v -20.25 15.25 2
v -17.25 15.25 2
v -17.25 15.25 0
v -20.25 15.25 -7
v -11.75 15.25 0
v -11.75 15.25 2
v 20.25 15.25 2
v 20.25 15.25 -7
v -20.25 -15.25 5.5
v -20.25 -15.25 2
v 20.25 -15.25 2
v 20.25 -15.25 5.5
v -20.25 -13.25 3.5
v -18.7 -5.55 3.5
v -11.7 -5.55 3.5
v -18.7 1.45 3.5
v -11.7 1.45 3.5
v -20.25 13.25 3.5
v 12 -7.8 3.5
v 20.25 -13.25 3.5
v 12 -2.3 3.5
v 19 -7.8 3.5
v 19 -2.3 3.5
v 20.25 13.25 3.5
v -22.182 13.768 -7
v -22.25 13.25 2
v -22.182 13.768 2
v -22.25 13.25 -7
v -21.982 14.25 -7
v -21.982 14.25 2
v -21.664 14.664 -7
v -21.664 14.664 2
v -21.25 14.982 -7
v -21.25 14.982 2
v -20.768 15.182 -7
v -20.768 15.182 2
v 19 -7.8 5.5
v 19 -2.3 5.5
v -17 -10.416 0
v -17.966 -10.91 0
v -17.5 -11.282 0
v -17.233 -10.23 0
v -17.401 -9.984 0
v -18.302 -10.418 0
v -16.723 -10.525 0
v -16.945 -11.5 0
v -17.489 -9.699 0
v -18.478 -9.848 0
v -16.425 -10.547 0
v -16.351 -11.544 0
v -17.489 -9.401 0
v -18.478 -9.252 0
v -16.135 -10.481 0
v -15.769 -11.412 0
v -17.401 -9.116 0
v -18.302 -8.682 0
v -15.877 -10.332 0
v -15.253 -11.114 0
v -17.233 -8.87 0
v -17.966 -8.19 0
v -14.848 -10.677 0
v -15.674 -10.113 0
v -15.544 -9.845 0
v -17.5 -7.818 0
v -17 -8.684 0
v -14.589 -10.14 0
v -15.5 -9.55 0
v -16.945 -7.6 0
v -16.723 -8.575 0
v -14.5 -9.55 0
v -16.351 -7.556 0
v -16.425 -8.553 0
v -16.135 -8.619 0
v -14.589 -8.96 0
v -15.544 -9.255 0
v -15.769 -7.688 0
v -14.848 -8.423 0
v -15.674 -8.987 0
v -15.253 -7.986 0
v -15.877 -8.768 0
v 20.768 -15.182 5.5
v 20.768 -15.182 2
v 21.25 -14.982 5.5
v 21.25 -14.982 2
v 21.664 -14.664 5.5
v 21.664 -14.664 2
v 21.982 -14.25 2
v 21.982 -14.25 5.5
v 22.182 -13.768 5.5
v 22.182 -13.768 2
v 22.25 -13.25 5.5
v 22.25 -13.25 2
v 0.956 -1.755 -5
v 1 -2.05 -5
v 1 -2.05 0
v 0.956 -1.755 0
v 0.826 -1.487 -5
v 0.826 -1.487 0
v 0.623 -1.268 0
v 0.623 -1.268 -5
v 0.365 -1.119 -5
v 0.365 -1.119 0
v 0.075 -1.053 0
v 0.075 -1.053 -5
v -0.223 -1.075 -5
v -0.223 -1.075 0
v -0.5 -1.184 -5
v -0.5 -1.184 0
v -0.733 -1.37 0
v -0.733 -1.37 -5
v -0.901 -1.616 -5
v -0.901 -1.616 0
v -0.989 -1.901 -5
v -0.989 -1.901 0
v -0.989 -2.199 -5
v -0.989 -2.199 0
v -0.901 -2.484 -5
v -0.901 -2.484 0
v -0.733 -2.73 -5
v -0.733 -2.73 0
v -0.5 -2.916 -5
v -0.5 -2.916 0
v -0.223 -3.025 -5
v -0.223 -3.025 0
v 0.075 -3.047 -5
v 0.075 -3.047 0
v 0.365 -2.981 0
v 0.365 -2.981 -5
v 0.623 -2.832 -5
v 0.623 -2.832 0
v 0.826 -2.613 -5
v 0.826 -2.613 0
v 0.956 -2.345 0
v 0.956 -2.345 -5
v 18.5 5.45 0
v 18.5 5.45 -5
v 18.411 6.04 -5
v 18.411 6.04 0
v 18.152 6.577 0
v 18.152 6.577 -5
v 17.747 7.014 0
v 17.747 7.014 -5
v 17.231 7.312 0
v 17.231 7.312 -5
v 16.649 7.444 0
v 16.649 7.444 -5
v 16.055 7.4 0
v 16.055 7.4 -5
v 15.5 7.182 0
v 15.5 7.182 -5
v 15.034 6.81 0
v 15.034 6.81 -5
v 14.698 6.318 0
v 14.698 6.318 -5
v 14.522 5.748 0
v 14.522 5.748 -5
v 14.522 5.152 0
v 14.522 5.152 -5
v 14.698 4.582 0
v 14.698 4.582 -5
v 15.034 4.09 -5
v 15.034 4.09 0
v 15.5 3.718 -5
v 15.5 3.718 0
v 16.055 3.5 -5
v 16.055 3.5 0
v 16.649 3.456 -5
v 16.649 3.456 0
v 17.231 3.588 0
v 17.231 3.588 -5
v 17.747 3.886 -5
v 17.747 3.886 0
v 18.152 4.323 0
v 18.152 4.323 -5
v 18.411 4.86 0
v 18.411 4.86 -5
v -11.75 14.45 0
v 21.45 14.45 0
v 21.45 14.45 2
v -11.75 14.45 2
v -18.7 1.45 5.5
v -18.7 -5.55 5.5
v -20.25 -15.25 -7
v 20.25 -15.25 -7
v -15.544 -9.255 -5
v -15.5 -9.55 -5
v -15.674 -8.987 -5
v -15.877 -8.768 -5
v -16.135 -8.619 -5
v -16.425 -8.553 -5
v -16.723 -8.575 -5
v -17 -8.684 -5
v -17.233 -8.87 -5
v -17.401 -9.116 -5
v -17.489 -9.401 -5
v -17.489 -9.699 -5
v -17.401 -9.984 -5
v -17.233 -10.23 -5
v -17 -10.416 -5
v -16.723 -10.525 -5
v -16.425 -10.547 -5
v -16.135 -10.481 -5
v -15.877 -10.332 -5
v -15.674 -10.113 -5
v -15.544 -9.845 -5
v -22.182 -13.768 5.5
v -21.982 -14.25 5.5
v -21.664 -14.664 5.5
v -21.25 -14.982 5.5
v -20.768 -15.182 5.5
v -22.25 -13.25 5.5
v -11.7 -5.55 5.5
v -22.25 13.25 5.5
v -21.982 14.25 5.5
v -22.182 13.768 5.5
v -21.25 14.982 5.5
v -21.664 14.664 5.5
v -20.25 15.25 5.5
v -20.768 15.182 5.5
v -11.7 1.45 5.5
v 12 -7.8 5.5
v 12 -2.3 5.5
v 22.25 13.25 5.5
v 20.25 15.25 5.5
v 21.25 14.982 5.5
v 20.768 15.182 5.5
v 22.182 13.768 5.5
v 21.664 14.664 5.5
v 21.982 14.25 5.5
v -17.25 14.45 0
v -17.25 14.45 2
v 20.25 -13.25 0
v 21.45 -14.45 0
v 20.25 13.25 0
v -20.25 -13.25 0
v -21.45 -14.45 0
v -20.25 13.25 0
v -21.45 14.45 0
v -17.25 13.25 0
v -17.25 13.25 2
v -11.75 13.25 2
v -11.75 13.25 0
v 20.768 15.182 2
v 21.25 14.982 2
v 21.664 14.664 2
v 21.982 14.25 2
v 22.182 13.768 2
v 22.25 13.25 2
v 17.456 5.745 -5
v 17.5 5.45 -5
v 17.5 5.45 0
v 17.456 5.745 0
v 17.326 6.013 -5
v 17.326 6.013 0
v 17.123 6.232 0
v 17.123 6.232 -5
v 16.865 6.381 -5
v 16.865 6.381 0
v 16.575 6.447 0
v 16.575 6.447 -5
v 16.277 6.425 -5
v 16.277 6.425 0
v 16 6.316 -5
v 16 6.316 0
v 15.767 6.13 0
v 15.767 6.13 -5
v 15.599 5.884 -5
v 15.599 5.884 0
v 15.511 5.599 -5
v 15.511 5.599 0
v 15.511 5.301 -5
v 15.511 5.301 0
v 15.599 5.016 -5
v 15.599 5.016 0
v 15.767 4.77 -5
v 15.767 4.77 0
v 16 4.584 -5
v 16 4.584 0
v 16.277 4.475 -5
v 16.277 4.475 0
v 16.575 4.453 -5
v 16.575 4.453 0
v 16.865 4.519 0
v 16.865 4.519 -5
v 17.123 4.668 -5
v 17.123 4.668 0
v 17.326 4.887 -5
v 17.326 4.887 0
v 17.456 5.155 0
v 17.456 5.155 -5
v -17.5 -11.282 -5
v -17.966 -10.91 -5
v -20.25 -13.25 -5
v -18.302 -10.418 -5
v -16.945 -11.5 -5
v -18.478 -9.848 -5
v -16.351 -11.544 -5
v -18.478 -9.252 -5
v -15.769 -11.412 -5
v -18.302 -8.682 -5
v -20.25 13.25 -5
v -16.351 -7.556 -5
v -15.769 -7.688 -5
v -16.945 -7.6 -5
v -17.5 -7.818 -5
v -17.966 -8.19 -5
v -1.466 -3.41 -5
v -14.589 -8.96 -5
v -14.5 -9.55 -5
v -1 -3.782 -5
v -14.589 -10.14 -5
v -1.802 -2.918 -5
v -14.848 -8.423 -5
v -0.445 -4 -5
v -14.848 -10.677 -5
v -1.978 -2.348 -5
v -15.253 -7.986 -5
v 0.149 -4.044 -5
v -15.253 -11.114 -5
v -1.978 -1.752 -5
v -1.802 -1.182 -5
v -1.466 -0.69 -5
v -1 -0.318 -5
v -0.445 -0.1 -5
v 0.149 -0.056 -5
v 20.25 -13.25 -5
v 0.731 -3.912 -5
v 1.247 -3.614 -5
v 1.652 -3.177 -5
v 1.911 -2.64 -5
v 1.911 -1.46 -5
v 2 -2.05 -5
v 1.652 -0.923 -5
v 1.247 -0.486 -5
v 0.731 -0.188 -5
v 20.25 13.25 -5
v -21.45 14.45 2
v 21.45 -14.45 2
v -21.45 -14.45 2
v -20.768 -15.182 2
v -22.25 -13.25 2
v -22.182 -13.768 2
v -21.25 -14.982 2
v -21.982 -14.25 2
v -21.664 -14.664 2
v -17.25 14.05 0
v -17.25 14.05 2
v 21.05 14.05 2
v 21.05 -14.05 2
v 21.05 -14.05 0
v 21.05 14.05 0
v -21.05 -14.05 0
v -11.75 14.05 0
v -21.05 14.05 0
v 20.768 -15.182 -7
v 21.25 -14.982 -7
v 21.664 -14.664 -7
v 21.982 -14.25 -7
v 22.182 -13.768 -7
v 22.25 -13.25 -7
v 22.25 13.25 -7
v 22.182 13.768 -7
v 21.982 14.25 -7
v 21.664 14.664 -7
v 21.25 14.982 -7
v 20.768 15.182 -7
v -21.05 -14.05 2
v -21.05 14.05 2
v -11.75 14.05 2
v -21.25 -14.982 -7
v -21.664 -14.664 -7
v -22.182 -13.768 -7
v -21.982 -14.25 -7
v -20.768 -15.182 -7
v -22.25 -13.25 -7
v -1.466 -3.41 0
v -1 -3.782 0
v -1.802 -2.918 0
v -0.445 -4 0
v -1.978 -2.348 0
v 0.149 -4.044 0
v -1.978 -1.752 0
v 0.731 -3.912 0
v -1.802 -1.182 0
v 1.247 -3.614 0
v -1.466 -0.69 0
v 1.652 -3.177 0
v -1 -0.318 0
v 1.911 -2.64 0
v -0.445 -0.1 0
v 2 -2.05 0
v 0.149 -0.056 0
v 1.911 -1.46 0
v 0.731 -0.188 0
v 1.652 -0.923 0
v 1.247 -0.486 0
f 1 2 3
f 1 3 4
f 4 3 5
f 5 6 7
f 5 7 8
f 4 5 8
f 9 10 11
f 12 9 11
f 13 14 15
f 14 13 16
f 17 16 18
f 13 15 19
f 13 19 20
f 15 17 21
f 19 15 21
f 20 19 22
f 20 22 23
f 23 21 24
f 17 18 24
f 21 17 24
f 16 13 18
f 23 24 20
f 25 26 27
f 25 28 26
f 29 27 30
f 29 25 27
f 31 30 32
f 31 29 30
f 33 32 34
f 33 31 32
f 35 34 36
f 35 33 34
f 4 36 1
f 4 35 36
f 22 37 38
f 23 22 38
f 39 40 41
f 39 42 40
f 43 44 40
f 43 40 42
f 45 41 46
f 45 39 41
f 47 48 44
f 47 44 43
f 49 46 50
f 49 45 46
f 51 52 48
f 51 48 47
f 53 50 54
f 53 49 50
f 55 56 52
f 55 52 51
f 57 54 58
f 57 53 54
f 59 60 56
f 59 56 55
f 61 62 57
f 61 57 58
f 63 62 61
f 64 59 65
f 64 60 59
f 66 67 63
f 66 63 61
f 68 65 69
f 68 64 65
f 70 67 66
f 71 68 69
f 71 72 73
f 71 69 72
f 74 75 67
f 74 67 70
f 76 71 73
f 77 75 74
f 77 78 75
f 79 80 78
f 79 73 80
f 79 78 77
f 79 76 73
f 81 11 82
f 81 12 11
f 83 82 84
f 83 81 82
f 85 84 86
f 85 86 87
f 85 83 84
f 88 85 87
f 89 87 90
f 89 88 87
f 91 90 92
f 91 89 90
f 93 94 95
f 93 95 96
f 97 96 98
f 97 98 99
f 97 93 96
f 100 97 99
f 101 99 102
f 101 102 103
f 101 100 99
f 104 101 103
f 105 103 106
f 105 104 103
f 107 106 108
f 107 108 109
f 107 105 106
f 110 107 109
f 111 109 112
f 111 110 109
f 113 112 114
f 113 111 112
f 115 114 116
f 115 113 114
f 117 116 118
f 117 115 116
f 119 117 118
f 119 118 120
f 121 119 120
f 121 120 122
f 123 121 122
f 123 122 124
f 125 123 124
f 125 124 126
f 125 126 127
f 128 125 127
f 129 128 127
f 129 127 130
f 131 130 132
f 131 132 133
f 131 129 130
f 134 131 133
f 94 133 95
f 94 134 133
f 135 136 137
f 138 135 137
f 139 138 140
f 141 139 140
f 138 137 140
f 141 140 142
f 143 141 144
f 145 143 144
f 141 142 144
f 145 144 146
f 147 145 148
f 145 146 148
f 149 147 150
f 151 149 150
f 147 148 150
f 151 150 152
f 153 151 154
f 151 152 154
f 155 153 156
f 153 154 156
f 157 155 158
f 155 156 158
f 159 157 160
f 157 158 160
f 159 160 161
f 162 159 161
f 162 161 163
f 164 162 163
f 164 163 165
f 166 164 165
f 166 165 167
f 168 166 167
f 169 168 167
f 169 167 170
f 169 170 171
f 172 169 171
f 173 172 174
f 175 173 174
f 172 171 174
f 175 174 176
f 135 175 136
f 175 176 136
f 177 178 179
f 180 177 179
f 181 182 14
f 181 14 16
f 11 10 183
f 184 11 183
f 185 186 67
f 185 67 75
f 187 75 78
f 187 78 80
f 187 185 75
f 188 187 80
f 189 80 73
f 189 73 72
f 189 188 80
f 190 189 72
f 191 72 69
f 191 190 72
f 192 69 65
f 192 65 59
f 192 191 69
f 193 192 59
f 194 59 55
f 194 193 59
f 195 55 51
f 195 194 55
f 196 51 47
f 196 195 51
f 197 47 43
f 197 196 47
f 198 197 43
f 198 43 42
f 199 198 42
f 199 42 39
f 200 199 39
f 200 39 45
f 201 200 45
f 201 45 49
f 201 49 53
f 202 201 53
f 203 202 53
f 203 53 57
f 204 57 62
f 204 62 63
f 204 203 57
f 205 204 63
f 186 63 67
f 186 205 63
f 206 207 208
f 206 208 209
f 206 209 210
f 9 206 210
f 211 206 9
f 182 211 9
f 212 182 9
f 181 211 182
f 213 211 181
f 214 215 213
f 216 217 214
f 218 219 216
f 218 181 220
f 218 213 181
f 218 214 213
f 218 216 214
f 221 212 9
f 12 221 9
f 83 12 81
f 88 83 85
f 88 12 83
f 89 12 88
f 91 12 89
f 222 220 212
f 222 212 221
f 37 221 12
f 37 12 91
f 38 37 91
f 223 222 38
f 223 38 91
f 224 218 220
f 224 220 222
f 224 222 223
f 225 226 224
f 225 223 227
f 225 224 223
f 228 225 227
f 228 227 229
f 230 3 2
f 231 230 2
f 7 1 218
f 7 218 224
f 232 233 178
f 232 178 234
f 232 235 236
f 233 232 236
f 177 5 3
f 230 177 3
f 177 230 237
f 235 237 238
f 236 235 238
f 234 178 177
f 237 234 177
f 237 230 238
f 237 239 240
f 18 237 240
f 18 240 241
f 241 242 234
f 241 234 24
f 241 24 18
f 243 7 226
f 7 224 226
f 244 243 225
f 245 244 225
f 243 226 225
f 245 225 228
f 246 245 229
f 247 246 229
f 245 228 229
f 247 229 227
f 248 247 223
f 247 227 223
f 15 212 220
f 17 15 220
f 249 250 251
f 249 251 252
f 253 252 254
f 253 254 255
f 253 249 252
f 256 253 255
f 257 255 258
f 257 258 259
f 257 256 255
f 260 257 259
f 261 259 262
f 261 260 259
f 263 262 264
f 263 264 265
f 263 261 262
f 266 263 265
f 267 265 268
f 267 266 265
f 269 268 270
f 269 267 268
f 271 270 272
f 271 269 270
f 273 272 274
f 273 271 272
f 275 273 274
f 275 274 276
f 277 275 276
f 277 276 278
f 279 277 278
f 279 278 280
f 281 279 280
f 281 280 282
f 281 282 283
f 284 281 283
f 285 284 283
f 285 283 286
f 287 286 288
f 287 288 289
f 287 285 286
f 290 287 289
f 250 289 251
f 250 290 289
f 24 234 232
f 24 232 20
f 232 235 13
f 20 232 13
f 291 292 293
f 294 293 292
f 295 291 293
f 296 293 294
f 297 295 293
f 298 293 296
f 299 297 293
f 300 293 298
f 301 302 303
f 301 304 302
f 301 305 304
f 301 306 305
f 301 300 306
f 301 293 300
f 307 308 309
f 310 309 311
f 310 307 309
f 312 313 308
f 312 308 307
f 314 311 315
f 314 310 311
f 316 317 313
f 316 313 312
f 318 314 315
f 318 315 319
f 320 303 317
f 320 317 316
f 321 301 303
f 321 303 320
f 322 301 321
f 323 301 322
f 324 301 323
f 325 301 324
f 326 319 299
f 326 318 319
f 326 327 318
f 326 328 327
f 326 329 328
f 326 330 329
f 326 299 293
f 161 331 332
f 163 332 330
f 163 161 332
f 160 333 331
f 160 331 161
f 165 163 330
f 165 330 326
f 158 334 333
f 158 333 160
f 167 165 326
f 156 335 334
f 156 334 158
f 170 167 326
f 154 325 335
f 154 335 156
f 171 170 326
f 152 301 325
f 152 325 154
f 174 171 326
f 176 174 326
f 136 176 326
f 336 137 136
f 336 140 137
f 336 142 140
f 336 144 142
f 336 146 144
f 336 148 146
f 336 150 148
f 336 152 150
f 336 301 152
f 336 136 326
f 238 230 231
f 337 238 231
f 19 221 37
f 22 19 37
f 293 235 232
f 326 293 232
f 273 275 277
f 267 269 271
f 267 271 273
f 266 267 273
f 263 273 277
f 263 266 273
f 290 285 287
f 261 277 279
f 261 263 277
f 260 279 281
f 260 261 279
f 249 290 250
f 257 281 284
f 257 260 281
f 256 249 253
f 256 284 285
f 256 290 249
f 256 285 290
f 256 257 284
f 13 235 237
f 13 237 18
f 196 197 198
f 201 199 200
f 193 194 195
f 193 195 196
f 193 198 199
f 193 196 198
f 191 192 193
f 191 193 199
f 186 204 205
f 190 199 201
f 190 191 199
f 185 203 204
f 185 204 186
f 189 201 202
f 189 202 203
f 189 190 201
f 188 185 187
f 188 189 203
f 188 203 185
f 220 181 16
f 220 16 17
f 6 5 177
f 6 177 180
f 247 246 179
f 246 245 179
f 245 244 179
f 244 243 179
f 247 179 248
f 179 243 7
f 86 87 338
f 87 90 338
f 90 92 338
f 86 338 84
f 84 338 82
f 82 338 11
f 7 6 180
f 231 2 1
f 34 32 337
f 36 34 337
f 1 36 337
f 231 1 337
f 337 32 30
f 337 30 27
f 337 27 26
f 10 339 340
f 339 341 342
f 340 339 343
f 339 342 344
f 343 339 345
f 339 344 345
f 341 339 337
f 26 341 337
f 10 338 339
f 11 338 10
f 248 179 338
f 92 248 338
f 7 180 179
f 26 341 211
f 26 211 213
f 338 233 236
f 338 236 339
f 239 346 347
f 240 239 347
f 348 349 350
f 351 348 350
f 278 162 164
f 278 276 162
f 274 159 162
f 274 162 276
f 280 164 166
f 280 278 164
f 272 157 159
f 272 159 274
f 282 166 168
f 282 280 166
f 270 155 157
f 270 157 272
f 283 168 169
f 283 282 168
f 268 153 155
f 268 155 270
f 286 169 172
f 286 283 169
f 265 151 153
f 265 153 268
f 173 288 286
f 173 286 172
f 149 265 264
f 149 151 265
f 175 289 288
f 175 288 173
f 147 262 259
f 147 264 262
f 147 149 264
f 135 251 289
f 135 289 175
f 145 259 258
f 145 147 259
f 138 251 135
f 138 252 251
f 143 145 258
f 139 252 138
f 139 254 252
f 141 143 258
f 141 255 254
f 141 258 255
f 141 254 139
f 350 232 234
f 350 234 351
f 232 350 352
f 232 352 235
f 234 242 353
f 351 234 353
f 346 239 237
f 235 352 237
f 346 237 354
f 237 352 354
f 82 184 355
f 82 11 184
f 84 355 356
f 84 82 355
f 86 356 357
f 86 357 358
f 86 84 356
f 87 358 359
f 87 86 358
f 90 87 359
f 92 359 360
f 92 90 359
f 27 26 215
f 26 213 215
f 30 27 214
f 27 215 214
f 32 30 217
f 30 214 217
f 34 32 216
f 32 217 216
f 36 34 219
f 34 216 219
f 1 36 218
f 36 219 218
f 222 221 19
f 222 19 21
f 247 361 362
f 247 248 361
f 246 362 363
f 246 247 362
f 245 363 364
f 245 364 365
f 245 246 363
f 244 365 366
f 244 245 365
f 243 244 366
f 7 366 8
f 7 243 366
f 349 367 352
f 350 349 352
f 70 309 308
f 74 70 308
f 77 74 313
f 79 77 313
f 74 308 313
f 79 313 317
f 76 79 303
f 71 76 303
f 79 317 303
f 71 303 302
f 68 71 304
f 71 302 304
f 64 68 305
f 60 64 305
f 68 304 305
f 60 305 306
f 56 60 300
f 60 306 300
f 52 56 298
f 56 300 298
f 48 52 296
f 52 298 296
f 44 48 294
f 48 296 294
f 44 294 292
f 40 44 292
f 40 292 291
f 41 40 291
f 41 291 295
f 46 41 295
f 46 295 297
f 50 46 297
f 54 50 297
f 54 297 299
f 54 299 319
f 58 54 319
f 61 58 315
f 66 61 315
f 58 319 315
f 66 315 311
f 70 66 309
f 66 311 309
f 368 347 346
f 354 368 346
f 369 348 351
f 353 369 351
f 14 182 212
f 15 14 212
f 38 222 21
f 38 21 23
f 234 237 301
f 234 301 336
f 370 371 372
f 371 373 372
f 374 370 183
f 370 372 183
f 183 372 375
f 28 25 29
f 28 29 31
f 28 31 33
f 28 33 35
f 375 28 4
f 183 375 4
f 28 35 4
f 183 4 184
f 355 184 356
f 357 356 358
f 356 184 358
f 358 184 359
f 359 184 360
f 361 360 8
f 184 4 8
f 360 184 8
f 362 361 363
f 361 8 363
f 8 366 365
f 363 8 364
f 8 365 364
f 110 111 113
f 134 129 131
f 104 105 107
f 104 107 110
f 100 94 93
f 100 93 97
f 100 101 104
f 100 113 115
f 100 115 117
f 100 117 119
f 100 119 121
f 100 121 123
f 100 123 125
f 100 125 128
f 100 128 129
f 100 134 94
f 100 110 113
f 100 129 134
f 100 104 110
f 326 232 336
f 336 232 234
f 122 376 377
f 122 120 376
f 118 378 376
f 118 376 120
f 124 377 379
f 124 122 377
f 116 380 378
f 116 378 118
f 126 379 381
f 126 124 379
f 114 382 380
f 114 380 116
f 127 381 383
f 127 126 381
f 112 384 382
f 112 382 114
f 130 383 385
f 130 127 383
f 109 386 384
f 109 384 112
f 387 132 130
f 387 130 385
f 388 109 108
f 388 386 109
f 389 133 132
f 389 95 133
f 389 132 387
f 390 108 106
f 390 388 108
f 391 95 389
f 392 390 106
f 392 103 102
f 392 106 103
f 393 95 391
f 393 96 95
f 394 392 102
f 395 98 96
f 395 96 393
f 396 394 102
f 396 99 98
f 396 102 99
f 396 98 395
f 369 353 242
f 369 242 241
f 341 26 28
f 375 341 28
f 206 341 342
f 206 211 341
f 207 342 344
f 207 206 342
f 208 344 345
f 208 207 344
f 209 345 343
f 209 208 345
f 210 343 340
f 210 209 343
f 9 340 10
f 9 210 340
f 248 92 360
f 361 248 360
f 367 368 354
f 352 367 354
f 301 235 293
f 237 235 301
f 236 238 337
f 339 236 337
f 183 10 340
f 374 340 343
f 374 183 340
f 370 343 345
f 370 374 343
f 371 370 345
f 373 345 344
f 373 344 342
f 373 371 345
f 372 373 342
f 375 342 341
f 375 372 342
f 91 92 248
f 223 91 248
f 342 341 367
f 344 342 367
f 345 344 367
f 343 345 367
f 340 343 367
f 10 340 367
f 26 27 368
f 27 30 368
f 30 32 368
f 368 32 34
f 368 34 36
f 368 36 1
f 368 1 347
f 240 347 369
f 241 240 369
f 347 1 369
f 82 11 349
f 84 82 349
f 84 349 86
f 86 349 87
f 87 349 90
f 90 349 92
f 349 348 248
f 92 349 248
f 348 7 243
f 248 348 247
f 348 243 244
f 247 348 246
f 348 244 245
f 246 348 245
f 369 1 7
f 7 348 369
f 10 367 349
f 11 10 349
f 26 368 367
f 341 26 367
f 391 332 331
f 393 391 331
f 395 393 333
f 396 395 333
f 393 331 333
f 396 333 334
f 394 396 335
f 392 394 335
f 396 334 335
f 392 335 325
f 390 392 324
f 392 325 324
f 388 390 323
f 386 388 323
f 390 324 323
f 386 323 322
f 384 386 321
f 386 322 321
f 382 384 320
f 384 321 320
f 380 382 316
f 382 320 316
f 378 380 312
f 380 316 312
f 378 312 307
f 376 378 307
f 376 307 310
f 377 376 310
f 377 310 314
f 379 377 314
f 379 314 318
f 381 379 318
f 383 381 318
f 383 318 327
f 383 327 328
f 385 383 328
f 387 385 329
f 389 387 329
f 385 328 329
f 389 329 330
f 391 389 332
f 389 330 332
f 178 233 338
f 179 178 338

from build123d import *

# Parameters (mm, degrees)
F0_W      = 44.5
F0_H      = 30.5
F1_DEPTH  = 7
F2_T      = -2
F3_DEPTH  = 5.5
F4_T      = -2
F6_DEPTH  = 2
F5_W      = 0.8
F5_H      = 2
F9_R      = 2
F9_R_2    = 1
F10_DEPTH = 5
F11_W     = 7
F11_H     = 7
F11_H_2   = 5.5
F12_DEPTH = 2
F13_R     = 2
F13_2_R   = 2
F14_W     = 5.5
F14_H     = 2
F15_DEPTH = 2


with BuildPart() as f1:
    # F0 (on Top) → F1 (new body)
    with BuildSketch(Plane.XY):
        Rectangle(F0_W, F0_H)
    extrude(amount=-F1_DEPTH)

    # F2
    f2_openings = [f1.faces().sort_by_distance(p)[0] for p in [
        (0, 0, 0),
    ]]
    offset(amount=F2_T, openings=f2_openings)

    # F8: sweep along a path in F0
    with BuildLine(Plane.XY) as f8_path:
        Line((22.25, -15.25), (-22.25, -15.25))
        Line((-22.25, -15.25), (-22.25, 15.25))
        Line((-22.25, 15.25), (22.25, 15.25))
        Line((22.25, 15.25), (22.25, -15.25))
    # F5 (on Right) → F8 (sweep)
    with BuildSketch(Plane.YZ):
        with Locations((-14.85, 1)):
            Rectangle(F5_W, F5_H)
    sweep(path=f8_path.line, transition=Transition.RIGHT)

    # F9 (on face) → F10 (join)
    with BuildSketch(Plane.XY.offset(-5)):
        with Locations((0, -2.05)):
            Circle(F9_R)
        with Locations((0, -2.05)):
            Circle(F9_R_2, mode=Mode.SUBTRACT)
        with Locations((-16.5, -9.55)):
            Circle(F9_R)
        with Locations((-16.5, -9.55)):
            Circle(F9_R_2, mode=Mode.SUBTRACT)
        with Locations((16.5, 5.45)):
            Circle(F9_R)
        with Locations((16.5, 5.45)):
            Circle(F9_R_2, mode=Mode.SUBTRACT)
    extrude(amount=F10_DEPTH)

    # F13
    f13_edges = [f1.edges().sort_by_distance(p)[0] for p in [
        (22.25, 15.25, -2.5),
        (22.25, -15.25, -2.5),
        (-22.25, -15.25, -2.5),
        (-22.25, 15.25, -2.5),
    ]]
    fillet(f13_edges, radius=F13_R)


with BuildPart() as f3:
    # F0 (on Top) → F3 (new body)
    with BuildSketch(Plane.XY):
        Rectangle(F0_W, F0_H)
    extrude(amount=F3_DEPTH)

    # F4
    f4_openings = [f3.faces().sort_by_distance(p)[0] for p in [
        (0, 0, 0),
    ]]
    offset(amount=F4_T, openings=f4_openings)

    # F0 (on Top) → F6 (cut)
    with BuildSketch(Plane.XY):
        Rectangle(F0_W, F0_H)
    extrude(amount=F6_DEPTH, mode=Mode.SUBTRACT)

    # F7: sweep along a path in F7_path
    with BuildLine(Plane(origin=(20.25, -13.25, 2), x_dir=(0, 1, 0), z_dir=(0, 0, 1))) as f7_path:
        Line((0, 0), (0, 40.5))
        Line((0, 40.5), (26.5, 40.5))
        Line((26.5, 40.5), (26.5, 0))
        Line((26.5, 0), (0, 0))
    # F5 (on Right) → F7 (sweep)
    with BuildSketch(Plane.YZ):
        with Locations((-13.65, 1)):
            Rectangle(F5_W, F5_H)
    sweep(path=f7_path.line, transition=Transition.RIGHT)

    # F11 (on face) → F12 (cut, through all)
    with BuildSketch(Plane.XY.offset(5.5)):
        with Locations((-15.2, -2.05)):
            Rectangle(F11_W, F11_H)
        with Locations((15.5, -5.05)):
            Rectangle(F11_W, F11_H_2)
    extrude(amount=-F12_DEPTH, mode=Mode.SUBTRACT)

    # F13#2
    f13_2_edges = [f3.edges().sort_by_distance(p)[0] for p in [
        (-22.25, -15.25, 3.75),
        (-22.25, 15.25, 3.75),
        (22.25, -15.25, 3.75),
        (22.25, 15.25, 3.75),
    ]]
    fillet(f13_2_edges, radius=F13_2_R)


with BuildPart() as f15_tool:
    # F14 (on face) → F15 (new body)
    with BuildSketch(Plane(origin=(0, 15.25, 0), x_dir=(-1, 0, 0), z_dir=(0, 1, 0))):
        with Locations((14.5, 1)):
            Rectangle(F14_W, F14_H)
    extrude(amount=-F15_DEPTH)


with BuildPart() as f1_1:
    add(f1.part)

    # F15: cut by f15_tool
    add(f15_tool.part, mode=Mode.SUBTRACT)


with BuildPart() as f3_1:
    add(f3.part)

    # F15: cut by f15_tool
    add(f15_tool.part, mode=Mode.SUBTRACT)


solid = Compound([f1_1.part, f3_1.part])
